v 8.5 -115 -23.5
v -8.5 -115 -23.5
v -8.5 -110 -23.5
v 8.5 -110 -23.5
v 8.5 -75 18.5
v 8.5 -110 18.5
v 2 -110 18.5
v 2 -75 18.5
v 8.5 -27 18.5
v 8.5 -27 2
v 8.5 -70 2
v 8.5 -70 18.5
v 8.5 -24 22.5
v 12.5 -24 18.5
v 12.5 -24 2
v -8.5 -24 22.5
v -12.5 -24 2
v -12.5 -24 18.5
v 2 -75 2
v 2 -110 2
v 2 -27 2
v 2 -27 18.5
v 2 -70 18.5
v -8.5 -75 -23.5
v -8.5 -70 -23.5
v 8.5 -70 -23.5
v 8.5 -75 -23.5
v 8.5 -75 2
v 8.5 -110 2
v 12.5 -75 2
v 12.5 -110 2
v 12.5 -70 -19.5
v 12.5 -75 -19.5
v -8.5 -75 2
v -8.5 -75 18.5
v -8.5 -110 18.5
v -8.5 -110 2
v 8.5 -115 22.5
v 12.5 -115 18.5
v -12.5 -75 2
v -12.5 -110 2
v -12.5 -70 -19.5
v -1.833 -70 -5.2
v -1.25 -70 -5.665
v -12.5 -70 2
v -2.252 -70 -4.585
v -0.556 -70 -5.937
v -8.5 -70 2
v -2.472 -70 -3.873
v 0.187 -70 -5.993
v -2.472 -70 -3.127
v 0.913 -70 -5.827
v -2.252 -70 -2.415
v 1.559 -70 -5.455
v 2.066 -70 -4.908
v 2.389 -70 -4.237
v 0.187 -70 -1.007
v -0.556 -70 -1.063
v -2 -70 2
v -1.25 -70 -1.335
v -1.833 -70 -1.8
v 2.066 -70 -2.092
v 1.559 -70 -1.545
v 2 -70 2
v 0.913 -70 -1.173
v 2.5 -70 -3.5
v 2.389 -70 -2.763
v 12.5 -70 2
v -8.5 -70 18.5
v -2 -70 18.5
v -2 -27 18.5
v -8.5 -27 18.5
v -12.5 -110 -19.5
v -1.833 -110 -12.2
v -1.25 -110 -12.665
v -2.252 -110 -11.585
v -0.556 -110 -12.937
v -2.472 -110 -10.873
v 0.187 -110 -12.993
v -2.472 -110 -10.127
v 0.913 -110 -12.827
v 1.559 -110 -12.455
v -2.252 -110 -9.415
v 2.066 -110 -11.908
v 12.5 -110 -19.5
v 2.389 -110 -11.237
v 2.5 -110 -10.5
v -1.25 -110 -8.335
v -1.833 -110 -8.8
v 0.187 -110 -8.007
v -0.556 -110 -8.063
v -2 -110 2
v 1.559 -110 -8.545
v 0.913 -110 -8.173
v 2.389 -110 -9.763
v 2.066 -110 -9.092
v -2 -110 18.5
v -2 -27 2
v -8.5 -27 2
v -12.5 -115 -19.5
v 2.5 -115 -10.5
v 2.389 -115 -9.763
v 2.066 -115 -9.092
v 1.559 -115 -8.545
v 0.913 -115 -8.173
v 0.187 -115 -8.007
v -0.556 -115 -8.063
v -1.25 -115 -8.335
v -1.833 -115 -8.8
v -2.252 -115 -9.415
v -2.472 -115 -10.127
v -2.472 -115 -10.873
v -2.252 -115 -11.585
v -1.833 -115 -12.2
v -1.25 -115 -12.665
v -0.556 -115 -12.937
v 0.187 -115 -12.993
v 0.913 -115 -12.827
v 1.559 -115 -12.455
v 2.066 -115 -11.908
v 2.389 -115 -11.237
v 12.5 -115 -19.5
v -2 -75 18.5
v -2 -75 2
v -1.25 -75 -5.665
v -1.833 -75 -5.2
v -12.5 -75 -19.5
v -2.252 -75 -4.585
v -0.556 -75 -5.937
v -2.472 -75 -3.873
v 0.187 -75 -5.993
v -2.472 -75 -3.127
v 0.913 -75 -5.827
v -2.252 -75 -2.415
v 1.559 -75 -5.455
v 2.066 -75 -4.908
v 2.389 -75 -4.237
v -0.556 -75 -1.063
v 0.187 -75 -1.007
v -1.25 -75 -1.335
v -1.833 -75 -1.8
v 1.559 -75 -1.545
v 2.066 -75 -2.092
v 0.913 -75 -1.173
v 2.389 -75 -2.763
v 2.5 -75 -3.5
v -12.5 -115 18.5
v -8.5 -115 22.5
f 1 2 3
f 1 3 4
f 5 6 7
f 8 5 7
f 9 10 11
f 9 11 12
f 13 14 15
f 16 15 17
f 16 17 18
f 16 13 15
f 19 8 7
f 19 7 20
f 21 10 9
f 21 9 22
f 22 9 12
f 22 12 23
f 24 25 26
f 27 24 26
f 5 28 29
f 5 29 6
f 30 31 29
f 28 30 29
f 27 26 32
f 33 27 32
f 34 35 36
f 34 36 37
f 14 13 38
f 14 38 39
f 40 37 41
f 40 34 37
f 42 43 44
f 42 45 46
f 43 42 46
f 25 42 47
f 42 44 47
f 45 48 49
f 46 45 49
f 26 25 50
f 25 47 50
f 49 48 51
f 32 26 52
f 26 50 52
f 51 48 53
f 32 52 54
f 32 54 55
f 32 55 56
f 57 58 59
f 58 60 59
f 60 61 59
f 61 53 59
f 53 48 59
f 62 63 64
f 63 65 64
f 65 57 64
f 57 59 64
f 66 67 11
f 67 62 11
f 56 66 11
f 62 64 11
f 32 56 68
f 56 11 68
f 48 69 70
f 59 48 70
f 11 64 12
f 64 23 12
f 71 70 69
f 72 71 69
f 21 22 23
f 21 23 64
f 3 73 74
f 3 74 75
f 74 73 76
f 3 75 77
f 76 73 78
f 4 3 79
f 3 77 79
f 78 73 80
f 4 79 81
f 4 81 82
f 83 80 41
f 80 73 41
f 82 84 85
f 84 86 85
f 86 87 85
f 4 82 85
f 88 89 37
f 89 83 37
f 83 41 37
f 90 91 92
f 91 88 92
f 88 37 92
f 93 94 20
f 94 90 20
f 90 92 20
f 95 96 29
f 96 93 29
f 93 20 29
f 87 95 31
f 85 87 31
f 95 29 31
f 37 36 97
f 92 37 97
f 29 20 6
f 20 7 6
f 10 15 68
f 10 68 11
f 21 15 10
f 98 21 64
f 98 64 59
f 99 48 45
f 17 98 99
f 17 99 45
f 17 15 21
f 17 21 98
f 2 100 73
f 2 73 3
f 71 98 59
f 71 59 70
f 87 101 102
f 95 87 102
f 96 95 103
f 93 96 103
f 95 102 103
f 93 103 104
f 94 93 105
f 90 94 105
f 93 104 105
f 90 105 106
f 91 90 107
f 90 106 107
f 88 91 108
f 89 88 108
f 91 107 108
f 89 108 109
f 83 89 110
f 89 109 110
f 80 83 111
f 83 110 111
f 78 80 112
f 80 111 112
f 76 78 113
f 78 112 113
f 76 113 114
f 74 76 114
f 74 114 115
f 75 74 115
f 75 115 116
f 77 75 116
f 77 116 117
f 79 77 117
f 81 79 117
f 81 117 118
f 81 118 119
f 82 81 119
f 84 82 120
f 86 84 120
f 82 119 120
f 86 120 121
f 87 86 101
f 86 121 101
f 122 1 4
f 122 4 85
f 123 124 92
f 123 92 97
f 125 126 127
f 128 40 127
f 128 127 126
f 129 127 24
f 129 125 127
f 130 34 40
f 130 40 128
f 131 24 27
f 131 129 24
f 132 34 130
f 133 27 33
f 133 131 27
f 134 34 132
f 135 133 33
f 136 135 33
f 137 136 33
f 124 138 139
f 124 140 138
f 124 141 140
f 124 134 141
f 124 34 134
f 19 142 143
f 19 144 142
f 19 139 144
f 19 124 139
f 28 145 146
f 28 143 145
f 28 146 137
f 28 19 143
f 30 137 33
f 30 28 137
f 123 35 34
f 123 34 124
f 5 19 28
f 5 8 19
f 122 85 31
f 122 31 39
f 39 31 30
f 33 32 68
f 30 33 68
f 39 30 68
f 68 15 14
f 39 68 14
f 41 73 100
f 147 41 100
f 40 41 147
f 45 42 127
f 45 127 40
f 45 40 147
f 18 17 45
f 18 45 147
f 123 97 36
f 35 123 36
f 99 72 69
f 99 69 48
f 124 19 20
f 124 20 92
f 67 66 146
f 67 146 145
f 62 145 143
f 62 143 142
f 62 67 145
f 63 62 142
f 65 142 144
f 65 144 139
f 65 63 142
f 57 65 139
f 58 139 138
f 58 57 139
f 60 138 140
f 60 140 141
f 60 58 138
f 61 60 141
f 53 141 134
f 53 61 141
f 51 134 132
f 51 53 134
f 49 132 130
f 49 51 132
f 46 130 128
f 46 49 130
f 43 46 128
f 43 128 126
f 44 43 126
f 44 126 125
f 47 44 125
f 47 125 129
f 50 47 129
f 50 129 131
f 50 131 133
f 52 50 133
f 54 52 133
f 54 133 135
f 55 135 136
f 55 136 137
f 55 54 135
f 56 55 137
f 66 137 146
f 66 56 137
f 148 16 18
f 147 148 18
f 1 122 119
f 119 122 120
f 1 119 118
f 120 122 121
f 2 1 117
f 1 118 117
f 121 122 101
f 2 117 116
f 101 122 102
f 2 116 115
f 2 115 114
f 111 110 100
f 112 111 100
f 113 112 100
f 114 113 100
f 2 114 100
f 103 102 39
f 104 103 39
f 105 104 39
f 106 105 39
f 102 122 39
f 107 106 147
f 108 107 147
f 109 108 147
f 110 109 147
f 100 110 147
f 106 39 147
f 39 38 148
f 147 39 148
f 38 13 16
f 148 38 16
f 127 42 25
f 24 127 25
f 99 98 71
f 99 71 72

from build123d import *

# Parameters (mm, degrees)
PAD008_DEPTH = 3
PAD009_DEPTH = 91
SKETCH019_R  = 2.5
PAD010_DEPTH = 5
SKETCH021_R  = 2.5
PAD011_DEPTH = 5


with BuildPart() as part:
    # Sketch017 → Pad008 (new body)
    with BuildSketch(Plane.XZ):
        Polygon((12.5, 2), (-12.5, 2), (-12.5, 18.5), (-8.5, 22.5), (8.5, 22.5), (12.5, 18.5), align=None)
    extrude(amount=PAD008_DEPTH)

    # Sketch018 → Pad009 (join)
    with BuildSketch(Plane.XZ):
        Polygon((-12.5, 2), (-12.5, 18.5), (-8.5, 22.5), (8.5, 22.5), (12.5, 18.5), (12.5, 2), (8.5, 2), (8.5, 18.5), (2, 18.5), (2, 2), (-2, 2), (-2, 18.5), (-8.5, 18.5), (-8.5, 2), align=None)
    extrude(amount=PAD009_DEPTH)

    # Sketch019 → Pad010 (join)
    with BuildSketch(Plane.XZ.offset(46)):
        Polygon((-12.5, 18.5), (-12.5, -19.5), (-8.5, -23.5), (8.5, -23.5), (12.5, -19.5), (12.5, 18.5), (8.5, 22.5), (-8.5, 22.5), align=None)
        with Locations((0, -3.5)):
            Circle(SKETCH019_R, mode=Mode.SUBTRACT)
    extrude(amount=PAD010_DEPTH)

    # Sketch021 → Pad011 (join)
    with BuildSketch(Plane.XZ.offset(91)):
        Polygon((-8.5, 22.5), (-12.5, 18.5), (-12.5, -19.5), (-8.5, -23.5), (8.5, -23.5), (12.5, -19.5), (12.5, 18.5), (8.5, 22.5), align=None)
        with Locations((0, -10.5)):
            Circle(SKETCH021_R, mode=Mode.SUBTRACT)
    extrude(amount=-PAD011_DEPTH)


with BuildPart() as part_1:
    # Body006 placement: moved
    add(part.part.moved(Location((0, -24, 0))))


solid = part_1.part
